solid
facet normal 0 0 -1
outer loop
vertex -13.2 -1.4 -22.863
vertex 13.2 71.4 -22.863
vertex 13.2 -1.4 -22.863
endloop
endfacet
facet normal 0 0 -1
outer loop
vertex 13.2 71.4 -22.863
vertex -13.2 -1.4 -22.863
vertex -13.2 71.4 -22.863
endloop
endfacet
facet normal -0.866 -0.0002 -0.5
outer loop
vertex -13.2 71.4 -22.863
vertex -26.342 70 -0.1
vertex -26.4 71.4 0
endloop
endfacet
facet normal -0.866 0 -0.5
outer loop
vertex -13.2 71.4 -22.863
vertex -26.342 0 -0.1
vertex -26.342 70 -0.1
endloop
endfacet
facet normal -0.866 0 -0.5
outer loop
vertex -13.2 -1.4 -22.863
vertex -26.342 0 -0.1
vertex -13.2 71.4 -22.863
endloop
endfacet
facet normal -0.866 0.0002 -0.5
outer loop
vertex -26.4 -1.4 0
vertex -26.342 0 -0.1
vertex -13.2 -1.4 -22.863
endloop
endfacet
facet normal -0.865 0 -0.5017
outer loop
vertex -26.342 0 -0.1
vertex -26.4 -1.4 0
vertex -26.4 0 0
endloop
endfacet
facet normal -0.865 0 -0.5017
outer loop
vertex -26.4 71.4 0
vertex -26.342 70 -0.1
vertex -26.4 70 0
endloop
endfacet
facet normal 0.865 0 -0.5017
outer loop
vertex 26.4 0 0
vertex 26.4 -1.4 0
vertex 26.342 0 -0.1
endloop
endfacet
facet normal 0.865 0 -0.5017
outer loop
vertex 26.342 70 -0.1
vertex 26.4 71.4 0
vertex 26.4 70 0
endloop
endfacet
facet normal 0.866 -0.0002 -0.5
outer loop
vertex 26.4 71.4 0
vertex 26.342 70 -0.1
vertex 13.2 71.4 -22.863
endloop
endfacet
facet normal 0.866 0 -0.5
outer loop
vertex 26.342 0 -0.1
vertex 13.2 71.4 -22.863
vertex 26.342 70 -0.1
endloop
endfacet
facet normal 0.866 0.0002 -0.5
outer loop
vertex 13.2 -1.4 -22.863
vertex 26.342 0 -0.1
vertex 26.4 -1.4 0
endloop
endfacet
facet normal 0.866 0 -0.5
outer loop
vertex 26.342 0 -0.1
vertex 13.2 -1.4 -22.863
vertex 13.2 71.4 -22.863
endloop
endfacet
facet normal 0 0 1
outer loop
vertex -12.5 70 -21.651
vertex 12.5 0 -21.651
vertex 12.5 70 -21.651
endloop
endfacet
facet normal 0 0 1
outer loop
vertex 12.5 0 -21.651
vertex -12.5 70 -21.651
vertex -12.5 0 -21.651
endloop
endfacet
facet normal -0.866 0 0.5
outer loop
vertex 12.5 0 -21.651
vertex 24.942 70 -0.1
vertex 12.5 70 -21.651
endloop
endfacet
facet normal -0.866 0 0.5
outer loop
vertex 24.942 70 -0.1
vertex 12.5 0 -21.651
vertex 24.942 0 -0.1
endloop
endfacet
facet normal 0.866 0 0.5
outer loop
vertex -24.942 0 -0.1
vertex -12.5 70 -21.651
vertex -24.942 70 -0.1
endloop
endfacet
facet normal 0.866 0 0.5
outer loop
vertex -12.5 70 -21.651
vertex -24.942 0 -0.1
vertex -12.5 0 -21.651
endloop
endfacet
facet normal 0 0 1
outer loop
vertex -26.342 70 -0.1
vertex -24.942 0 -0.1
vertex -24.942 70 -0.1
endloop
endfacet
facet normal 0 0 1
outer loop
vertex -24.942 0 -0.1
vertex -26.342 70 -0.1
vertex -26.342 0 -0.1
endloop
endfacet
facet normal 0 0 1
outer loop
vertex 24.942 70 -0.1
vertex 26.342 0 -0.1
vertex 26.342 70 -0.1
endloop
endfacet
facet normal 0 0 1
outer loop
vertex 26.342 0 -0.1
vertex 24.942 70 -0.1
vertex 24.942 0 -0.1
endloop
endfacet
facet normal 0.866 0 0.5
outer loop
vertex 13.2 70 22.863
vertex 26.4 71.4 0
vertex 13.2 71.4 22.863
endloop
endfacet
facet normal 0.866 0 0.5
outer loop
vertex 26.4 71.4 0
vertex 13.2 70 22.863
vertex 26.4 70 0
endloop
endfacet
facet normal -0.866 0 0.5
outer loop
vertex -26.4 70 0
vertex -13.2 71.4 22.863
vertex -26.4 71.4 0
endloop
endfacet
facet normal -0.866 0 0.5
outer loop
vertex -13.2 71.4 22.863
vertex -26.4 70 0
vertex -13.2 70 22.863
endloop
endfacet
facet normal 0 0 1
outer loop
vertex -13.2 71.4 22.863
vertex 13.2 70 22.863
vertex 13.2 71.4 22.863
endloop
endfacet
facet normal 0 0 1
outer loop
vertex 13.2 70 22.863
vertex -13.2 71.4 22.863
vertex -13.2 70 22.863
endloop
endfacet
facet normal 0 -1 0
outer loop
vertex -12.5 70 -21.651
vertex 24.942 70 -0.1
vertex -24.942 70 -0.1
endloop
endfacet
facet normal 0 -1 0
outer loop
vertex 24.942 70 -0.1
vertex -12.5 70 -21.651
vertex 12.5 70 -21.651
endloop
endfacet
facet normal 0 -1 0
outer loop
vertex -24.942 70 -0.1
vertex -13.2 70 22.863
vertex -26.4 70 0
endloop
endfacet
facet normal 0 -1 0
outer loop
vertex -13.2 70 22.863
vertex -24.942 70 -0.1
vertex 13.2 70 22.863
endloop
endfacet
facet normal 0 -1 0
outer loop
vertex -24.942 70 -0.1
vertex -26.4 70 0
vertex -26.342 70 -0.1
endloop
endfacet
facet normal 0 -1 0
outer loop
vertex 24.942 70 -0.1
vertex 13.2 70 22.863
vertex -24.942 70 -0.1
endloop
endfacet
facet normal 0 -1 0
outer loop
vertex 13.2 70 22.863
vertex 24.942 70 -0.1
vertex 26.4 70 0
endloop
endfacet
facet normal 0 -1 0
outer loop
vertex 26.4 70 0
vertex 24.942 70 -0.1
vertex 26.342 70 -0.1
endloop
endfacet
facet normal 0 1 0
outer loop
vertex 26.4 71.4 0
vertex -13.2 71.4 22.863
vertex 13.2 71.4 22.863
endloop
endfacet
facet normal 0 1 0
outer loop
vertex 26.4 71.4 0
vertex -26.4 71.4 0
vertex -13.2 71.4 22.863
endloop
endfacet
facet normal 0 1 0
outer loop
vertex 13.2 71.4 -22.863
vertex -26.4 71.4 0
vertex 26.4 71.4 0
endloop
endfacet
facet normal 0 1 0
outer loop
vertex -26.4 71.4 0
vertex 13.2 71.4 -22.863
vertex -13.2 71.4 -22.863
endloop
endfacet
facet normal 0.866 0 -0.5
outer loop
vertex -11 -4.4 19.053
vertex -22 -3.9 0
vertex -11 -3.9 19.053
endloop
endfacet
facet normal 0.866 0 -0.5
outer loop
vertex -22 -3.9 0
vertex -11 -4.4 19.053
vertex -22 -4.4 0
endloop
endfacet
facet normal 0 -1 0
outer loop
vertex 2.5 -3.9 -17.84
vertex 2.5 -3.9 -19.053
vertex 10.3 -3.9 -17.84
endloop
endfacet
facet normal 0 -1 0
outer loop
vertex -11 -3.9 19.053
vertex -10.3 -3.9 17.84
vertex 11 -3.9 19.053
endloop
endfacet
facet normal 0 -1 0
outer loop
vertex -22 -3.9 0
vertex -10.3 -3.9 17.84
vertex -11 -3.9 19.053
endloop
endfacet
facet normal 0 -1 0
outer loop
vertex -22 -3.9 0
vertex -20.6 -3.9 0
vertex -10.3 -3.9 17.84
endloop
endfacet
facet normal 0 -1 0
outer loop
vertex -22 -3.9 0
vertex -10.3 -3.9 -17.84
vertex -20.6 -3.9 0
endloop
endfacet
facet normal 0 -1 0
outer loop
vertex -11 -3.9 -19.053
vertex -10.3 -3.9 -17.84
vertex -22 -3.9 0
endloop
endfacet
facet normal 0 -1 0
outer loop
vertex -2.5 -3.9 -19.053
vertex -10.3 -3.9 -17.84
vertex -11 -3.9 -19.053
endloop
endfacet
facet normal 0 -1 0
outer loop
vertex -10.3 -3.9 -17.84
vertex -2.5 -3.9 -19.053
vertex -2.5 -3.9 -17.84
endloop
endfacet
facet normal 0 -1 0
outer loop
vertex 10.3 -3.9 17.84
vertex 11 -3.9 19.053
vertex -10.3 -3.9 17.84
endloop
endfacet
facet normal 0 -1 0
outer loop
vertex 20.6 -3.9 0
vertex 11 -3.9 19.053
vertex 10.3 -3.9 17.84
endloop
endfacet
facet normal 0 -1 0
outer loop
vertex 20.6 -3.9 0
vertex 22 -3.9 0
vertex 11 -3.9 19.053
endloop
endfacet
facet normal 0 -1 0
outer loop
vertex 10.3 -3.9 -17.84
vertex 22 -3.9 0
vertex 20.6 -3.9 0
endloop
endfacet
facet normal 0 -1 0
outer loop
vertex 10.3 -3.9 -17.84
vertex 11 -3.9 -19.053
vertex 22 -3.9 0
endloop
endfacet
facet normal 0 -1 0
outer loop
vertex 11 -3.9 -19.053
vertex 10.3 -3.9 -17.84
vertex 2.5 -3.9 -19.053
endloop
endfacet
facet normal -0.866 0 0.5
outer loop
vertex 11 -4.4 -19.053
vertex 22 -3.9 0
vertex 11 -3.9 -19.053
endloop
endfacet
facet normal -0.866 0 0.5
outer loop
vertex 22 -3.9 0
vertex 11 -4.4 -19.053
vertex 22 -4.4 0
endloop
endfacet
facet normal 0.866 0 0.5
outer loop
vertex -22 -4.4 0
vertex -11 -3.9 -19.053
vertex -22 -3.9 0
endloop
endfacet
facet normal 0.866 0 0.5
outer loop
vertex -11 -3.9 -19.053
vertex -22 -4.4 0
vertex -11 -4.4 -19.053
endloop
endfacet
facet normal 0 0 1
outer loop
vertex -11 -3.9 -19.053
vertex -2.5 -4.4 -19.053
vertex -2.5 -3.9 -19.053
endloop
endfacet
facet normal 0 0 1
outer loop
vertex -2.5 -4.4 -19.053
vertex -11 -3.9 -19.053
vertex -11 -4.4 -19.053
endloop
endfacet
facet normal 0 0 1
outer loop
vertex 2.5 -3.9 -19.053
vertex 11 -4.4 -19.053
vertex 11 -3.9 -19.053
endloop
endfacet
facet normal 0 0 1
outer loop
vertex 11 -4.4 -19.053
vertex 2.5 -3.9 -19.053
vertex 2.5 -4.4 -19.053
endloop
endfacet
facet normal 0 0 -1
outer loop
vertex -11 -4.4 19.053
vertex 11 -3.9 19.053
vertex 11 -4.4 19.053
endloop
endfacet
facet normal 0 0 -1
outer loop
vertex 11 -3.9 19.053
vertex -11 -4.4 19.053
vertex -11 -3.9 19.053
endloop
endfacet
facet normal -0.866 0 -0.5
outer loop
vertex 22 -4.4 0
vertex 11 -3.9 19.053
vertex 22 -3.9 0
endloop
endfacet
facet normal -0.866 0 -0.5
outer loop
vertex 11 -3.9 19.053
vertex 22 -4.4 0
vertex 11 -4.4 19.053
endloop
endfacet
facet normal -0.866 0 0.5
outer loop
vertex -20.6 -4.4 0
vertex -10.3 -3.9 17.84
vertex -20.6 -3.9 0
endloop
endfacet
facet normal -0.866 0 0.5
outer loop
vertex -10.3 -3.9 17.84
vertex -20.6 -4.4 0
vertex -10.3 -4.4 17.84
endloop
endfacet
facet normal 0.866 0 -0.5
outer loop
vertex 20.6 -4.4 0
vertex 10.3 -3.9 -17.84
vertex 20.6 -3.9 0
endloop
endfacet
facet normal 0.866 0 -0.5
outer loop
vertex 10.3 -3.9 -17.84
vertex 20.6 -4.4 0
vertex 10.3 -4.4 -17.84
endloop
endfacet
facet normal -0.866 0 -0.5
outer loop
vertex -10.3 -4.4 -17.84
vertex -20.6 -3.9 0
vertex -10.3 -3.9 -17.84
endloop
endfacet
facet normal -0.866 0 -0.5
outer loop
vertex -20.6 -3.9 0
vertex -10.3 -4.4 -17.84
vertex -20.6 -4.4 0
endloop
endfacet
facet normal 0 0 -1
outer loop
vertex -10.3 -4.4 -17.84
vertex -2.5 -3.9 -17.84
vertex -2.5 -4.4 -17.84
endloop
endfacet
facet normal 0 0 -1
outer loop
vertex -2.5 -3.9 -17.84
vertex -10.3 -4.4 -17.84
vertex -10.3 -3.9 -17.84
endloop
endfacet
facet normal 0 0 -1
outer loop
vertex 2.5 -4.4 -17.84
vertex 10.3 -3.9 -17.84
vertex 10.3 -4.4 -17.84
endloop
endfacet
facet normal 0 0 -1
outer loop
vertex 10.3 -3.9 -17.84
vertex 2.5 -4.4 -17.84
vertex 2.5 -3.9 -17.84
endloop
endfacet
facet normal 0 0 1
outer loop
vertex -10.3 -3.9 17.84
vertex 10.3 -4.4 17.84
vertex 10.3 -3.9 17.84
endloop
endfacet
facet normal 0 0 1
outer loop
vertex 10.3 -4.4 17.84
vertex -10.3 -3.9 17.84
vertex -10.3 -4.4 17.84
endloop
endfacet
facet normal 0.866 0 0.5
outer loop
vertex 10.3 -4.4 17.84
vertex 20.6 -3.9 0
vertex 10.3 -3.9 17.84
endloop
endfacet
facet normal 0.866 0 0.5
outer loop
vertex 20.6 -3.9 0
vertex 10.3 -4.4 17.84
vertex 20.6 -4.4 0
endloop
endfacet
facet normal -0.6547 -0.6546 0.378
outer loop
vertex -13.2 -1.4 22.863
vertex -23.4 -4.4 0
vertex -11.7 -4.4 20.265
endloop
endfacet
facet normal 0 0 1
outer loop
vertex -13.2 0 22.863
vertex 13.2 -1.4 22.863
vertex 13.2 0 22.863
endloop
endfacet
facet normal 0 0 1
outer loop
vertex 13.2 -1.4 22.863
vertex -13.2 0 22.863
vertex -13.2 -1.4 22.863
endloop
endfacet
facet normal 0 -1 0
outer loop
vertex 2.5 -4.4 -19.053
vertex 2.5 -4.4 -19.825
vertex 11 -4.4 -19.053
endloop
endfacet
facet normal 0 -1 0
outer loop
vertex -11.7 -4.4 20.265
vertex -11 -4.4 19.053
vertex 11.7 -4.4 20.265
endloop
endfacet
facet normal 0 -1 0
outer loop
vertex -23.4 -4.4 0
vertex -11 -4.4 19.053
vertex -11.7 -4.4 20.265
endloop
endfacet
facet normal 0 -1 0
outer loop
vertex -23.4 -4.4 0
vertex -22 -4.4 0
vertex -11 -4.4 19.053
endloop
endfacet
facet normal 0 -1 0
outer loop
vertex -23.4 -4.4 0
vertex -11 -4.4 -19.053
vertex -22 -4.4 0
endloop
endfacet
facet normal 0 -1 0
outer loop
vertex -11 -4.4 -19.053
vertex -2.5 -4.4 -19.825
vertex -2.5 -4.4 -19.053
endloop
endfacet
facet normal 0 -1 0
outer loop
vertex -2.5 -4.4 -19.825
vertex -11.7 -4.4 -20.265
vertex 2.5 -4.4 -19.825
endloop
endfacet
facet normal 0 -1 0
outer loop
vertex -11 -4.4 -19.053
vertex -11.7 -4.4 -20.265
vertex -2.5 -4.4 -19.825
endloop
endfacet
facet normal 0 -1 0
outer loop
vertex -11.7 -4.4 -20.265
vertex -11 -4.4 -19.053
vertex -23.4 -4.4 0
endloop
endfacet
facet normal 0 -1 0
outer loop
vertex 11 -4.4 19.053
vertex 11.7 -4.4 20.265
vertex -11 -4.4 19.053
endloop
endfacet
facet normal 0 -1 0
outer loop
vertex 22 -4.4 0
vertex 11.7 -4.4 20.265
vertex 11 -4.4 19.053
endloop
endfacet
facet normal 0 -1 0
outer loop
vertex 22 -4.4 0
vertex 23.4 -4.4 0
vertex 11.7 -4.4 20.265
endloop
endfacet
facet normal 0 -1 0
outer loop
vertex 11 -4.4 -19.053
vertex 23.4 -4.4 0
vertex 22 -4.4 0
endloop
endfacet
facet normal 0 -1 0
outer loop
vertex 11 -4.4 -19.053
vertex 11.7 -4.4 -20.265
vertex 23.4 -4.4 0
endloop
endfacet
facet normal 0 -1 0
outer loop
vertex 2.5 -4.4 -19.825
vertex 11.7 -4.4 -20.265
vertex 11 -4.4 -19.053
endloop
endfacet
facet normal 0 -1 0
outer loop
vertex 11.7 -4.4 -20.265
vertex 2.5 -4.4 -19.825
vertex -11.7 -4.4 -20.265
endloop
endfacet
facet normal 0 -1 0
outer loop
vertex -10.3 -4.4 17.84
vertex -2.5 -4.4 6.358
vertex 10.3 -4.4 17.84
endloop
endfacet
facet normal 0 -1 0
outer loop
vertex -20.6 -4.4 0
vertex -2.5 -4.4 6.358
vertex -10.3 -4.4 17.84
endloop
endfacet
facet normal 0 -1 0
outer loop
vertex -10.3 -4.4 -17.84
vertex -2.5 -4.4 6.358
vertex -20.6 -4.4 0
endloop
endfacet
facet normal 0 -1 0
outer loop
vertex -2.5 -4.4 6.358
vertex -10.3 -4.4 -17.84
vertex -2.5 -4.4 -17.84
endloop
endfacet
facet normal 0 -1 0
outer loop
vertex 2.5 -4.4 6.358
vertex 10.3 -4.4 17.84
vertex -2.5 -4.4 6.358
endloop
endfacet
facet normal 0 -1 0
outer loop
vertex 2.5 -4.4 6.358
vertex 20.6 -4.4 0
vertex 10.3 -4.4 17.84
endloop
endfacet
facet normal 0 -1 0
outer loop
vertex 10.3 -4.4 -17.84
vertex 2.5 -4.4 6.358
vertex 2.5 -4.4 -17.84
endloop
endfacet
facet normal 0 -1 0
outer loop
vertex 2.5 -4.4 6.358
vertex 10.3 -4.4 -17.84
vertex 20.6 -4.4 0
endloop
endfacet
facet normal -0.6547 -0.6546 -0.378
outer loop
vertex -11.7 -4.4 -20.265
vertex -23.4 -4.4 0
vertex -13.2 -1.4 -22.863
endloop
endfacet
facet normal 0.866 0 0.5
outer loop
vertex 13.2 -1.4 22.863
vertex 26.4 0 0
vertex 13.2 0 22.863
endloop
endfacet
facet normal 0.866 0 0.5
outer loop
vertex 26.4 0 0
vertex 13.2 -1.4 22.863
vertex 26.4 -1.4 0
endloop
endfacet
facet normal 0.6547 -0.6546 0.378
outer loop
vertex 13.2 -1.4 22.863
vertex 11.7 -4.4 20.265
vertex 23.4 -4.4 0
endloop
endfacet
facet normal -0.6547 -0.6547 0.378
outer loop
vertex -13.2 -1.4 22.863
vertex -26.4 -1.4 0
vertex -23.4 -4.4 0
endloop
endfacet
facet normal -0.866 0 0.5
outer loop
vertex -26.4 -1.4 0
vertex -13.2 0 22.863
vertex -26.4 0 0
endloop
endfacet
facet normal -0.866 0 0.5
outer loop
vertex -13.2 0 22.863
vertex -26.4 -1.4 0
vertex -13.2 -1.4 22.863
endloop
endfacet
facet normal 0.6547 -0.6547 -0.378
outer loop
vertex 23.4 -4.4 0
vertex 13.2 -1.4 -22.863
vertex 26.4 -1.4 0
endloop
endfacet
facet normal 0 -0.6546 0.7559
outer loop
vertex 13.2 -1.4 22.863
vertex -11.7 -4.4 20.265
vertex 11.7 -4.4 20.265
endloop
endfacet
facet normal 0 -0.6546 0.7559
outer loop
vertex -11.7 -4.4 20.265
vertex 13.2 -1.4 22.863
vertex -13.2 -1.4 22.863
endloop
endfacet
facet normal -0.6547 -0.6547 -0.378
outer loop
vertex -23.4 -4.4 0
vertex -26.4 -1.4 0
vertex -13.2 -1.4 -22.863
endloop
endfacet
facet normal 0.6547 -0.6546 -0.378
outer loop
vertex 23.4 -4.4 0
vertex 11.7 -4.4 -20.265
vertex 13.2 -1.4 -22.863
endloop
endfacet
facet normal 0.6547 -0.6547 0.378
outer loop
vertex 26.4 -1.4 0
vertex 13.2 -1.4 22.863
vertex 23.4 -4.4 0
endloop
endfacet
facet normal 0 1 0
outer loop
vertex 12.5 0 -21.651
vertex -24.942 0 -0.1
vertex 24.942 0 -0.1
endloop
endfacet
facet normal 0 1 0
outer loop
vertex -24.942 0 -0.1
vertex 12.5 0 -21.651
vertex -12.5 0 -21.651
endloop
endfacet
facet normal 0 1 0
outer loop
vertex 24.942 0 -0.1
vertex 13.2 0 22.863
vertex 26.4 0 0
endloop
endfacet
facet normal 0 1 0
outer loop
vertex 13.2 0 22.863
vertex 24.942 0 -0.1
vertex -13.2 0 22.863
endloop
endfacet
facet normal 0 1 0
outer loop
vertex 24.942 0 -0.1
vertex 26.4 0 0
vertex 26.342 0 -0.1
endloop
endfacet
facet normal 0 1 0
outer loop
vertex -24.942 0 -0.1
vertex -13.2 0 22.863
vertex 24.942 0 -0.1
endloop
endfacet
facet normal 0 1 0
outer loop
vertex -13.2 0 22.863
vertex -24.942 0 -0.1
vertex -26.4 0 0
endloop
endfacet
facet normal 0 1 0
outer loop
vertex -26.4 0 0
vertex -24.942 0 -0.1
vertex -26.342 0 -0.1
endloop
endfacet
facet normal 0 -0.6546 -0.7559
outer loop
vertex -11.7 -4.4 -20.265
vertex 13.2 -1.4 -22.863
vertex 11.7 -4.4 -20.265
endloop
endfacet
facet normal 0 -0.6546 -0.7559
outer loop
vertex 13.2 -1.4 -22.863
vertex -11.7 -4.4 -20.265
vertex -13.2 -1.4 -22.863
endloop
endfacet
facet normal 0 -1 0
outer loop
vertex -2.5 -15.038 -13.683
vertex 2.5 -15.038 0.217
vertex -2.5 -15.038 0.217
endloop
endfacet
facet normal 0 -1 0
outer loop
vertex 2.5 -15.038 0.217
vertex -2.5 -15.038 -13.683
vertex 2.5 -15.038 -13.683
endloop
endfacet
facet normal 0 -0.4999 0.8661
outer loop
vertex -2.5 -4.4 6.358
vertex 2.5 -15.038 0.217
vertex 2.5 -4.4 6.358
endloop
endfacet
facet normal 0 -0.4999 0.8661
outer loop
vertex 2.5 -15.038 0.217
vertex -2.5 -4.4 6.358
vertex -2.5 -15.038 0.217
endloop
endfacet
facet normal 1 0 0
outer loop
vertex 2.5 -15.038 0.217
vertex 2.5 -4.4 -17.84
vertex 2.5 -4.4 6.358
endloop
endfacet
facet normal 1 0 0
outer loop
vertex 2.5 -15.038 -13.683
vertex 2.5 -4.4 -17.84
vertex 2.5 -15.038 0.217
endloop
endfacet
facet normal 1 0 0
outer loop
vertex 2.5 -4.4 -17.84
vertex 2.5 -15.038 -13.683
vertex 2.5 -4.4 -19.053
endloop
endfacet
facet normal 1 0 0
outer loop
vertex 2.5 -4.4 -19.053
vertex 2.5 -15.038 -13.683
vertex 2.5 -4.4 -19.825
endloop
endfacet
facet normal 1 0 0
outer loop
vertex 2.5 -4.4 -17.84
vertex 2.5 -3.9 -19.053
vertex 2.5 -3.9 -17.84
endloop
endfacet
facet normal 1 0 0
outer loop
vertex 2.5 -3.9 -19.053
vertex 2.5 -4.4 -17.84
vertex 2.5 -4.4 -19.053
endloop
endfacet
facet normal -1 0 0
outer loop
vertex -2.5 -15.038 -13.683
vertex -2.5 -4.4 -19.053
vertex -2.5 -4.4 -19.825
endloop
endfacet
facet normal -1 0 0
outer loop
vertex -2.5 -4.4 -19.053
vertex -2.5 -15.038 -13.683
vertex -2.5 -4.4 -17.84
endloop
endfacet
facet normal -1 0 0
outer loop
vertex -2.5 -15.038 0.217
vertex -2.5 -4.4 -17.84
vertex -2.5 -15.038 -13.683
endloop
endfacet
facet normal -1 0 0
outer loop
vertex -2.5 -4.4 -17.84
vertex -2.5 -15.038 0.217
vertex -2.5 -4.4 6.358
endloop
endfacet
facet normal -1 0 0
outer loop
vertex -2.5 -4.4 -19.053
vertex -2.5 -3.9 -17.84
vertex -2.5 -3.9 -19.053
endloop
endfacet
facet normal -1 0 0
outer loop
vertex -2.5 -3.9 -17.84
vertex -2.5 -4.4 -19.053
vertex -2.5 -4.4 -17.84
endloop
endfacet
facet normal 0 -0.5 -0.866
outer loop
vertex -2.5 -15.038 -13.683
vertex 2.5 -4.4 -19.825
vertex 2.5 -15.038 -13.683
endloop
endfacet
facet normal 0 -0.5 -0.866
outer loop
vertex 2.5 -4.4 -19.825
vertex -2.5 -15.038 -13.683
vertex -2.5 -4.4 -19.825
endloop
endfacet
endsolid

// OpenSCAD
// file: config.scad
/* [Global] */

//Drawer Depth: the inner depth of the drawer itself
d_d = 70; // [20:1000]

//Drawer Width: the width inside the widest part of the drawer
d_w = 50; // [25:500]

//Drawer wall thickness (adjust to optimize printing based on your extrusion width or to make drawers tougher)
d_wt = 1.4;

/* [Mounting] */

//Wall mount: whether to include holes at the back of the modules for mounting to a wall
wallmount = 1; // [1:Yes, 0:No]

//Wall mount: hole diameter
wall_d = 5;

//TODO: top/bottom mount options? or a separate 'base' piece that can be attached to things?

/* [Adjustments] */

//Drawer tolerance: amount of space to leave around the drawer to allow it to slide
d_tol = 1;
// main file
include <config.scad>

use <MCAD/regular_shapes.scad>


drawer();

module drawer() {
	union() {
		//the main body of the drawer
		difference() {
			translate([0,-0.01,0]) rotate([-90,0,0]) hexagon_tube(d_d + 0.02, d_w/2 + d_wt, d_wt);
			translate([-d_w,-0.1,-0.1]) cube([d_w*2, d_d*2, d_w]);
		}

		//drawer back
		translate([0,d_d, 0]) rotate([-90,0,0]) drawer_face();
	}
}

	//drawer front
	rotate([90,0,0]) drawer_front();


module drawer_face() {
	hexagon_prism(d_wt, d_w/2 + d_wt);
}

module drawer_front() {
	ft = 3; //front panel thickness

	difference() {
		hull() {
			drawer_face();	
			translate([0, 0, d_wt]) hexagon_prism(ft, d_w/2 + d_wt - ft);
		}

		//accent groove
		translate([0,0, ft + d_wt - 0.5]) hexagon_tube(0.6, d_w/2 - ft, d_wt);
	}

	//handle
	translate([0, 0, ft]) difference() {
		rotate([0,-90,0]) translate([0, -d_w/6 - d_wt + ft, -2.5]) rotate([0,0,90]) hexagon_prism(5, d_w/4 + d_wt);

		translate([-d_w, -d_w, -d_w*2]) cube([d_w*2, d_w*2, d_w*2]);
	}

	//TODO: inscribe author info and config parameters on back of face
}
